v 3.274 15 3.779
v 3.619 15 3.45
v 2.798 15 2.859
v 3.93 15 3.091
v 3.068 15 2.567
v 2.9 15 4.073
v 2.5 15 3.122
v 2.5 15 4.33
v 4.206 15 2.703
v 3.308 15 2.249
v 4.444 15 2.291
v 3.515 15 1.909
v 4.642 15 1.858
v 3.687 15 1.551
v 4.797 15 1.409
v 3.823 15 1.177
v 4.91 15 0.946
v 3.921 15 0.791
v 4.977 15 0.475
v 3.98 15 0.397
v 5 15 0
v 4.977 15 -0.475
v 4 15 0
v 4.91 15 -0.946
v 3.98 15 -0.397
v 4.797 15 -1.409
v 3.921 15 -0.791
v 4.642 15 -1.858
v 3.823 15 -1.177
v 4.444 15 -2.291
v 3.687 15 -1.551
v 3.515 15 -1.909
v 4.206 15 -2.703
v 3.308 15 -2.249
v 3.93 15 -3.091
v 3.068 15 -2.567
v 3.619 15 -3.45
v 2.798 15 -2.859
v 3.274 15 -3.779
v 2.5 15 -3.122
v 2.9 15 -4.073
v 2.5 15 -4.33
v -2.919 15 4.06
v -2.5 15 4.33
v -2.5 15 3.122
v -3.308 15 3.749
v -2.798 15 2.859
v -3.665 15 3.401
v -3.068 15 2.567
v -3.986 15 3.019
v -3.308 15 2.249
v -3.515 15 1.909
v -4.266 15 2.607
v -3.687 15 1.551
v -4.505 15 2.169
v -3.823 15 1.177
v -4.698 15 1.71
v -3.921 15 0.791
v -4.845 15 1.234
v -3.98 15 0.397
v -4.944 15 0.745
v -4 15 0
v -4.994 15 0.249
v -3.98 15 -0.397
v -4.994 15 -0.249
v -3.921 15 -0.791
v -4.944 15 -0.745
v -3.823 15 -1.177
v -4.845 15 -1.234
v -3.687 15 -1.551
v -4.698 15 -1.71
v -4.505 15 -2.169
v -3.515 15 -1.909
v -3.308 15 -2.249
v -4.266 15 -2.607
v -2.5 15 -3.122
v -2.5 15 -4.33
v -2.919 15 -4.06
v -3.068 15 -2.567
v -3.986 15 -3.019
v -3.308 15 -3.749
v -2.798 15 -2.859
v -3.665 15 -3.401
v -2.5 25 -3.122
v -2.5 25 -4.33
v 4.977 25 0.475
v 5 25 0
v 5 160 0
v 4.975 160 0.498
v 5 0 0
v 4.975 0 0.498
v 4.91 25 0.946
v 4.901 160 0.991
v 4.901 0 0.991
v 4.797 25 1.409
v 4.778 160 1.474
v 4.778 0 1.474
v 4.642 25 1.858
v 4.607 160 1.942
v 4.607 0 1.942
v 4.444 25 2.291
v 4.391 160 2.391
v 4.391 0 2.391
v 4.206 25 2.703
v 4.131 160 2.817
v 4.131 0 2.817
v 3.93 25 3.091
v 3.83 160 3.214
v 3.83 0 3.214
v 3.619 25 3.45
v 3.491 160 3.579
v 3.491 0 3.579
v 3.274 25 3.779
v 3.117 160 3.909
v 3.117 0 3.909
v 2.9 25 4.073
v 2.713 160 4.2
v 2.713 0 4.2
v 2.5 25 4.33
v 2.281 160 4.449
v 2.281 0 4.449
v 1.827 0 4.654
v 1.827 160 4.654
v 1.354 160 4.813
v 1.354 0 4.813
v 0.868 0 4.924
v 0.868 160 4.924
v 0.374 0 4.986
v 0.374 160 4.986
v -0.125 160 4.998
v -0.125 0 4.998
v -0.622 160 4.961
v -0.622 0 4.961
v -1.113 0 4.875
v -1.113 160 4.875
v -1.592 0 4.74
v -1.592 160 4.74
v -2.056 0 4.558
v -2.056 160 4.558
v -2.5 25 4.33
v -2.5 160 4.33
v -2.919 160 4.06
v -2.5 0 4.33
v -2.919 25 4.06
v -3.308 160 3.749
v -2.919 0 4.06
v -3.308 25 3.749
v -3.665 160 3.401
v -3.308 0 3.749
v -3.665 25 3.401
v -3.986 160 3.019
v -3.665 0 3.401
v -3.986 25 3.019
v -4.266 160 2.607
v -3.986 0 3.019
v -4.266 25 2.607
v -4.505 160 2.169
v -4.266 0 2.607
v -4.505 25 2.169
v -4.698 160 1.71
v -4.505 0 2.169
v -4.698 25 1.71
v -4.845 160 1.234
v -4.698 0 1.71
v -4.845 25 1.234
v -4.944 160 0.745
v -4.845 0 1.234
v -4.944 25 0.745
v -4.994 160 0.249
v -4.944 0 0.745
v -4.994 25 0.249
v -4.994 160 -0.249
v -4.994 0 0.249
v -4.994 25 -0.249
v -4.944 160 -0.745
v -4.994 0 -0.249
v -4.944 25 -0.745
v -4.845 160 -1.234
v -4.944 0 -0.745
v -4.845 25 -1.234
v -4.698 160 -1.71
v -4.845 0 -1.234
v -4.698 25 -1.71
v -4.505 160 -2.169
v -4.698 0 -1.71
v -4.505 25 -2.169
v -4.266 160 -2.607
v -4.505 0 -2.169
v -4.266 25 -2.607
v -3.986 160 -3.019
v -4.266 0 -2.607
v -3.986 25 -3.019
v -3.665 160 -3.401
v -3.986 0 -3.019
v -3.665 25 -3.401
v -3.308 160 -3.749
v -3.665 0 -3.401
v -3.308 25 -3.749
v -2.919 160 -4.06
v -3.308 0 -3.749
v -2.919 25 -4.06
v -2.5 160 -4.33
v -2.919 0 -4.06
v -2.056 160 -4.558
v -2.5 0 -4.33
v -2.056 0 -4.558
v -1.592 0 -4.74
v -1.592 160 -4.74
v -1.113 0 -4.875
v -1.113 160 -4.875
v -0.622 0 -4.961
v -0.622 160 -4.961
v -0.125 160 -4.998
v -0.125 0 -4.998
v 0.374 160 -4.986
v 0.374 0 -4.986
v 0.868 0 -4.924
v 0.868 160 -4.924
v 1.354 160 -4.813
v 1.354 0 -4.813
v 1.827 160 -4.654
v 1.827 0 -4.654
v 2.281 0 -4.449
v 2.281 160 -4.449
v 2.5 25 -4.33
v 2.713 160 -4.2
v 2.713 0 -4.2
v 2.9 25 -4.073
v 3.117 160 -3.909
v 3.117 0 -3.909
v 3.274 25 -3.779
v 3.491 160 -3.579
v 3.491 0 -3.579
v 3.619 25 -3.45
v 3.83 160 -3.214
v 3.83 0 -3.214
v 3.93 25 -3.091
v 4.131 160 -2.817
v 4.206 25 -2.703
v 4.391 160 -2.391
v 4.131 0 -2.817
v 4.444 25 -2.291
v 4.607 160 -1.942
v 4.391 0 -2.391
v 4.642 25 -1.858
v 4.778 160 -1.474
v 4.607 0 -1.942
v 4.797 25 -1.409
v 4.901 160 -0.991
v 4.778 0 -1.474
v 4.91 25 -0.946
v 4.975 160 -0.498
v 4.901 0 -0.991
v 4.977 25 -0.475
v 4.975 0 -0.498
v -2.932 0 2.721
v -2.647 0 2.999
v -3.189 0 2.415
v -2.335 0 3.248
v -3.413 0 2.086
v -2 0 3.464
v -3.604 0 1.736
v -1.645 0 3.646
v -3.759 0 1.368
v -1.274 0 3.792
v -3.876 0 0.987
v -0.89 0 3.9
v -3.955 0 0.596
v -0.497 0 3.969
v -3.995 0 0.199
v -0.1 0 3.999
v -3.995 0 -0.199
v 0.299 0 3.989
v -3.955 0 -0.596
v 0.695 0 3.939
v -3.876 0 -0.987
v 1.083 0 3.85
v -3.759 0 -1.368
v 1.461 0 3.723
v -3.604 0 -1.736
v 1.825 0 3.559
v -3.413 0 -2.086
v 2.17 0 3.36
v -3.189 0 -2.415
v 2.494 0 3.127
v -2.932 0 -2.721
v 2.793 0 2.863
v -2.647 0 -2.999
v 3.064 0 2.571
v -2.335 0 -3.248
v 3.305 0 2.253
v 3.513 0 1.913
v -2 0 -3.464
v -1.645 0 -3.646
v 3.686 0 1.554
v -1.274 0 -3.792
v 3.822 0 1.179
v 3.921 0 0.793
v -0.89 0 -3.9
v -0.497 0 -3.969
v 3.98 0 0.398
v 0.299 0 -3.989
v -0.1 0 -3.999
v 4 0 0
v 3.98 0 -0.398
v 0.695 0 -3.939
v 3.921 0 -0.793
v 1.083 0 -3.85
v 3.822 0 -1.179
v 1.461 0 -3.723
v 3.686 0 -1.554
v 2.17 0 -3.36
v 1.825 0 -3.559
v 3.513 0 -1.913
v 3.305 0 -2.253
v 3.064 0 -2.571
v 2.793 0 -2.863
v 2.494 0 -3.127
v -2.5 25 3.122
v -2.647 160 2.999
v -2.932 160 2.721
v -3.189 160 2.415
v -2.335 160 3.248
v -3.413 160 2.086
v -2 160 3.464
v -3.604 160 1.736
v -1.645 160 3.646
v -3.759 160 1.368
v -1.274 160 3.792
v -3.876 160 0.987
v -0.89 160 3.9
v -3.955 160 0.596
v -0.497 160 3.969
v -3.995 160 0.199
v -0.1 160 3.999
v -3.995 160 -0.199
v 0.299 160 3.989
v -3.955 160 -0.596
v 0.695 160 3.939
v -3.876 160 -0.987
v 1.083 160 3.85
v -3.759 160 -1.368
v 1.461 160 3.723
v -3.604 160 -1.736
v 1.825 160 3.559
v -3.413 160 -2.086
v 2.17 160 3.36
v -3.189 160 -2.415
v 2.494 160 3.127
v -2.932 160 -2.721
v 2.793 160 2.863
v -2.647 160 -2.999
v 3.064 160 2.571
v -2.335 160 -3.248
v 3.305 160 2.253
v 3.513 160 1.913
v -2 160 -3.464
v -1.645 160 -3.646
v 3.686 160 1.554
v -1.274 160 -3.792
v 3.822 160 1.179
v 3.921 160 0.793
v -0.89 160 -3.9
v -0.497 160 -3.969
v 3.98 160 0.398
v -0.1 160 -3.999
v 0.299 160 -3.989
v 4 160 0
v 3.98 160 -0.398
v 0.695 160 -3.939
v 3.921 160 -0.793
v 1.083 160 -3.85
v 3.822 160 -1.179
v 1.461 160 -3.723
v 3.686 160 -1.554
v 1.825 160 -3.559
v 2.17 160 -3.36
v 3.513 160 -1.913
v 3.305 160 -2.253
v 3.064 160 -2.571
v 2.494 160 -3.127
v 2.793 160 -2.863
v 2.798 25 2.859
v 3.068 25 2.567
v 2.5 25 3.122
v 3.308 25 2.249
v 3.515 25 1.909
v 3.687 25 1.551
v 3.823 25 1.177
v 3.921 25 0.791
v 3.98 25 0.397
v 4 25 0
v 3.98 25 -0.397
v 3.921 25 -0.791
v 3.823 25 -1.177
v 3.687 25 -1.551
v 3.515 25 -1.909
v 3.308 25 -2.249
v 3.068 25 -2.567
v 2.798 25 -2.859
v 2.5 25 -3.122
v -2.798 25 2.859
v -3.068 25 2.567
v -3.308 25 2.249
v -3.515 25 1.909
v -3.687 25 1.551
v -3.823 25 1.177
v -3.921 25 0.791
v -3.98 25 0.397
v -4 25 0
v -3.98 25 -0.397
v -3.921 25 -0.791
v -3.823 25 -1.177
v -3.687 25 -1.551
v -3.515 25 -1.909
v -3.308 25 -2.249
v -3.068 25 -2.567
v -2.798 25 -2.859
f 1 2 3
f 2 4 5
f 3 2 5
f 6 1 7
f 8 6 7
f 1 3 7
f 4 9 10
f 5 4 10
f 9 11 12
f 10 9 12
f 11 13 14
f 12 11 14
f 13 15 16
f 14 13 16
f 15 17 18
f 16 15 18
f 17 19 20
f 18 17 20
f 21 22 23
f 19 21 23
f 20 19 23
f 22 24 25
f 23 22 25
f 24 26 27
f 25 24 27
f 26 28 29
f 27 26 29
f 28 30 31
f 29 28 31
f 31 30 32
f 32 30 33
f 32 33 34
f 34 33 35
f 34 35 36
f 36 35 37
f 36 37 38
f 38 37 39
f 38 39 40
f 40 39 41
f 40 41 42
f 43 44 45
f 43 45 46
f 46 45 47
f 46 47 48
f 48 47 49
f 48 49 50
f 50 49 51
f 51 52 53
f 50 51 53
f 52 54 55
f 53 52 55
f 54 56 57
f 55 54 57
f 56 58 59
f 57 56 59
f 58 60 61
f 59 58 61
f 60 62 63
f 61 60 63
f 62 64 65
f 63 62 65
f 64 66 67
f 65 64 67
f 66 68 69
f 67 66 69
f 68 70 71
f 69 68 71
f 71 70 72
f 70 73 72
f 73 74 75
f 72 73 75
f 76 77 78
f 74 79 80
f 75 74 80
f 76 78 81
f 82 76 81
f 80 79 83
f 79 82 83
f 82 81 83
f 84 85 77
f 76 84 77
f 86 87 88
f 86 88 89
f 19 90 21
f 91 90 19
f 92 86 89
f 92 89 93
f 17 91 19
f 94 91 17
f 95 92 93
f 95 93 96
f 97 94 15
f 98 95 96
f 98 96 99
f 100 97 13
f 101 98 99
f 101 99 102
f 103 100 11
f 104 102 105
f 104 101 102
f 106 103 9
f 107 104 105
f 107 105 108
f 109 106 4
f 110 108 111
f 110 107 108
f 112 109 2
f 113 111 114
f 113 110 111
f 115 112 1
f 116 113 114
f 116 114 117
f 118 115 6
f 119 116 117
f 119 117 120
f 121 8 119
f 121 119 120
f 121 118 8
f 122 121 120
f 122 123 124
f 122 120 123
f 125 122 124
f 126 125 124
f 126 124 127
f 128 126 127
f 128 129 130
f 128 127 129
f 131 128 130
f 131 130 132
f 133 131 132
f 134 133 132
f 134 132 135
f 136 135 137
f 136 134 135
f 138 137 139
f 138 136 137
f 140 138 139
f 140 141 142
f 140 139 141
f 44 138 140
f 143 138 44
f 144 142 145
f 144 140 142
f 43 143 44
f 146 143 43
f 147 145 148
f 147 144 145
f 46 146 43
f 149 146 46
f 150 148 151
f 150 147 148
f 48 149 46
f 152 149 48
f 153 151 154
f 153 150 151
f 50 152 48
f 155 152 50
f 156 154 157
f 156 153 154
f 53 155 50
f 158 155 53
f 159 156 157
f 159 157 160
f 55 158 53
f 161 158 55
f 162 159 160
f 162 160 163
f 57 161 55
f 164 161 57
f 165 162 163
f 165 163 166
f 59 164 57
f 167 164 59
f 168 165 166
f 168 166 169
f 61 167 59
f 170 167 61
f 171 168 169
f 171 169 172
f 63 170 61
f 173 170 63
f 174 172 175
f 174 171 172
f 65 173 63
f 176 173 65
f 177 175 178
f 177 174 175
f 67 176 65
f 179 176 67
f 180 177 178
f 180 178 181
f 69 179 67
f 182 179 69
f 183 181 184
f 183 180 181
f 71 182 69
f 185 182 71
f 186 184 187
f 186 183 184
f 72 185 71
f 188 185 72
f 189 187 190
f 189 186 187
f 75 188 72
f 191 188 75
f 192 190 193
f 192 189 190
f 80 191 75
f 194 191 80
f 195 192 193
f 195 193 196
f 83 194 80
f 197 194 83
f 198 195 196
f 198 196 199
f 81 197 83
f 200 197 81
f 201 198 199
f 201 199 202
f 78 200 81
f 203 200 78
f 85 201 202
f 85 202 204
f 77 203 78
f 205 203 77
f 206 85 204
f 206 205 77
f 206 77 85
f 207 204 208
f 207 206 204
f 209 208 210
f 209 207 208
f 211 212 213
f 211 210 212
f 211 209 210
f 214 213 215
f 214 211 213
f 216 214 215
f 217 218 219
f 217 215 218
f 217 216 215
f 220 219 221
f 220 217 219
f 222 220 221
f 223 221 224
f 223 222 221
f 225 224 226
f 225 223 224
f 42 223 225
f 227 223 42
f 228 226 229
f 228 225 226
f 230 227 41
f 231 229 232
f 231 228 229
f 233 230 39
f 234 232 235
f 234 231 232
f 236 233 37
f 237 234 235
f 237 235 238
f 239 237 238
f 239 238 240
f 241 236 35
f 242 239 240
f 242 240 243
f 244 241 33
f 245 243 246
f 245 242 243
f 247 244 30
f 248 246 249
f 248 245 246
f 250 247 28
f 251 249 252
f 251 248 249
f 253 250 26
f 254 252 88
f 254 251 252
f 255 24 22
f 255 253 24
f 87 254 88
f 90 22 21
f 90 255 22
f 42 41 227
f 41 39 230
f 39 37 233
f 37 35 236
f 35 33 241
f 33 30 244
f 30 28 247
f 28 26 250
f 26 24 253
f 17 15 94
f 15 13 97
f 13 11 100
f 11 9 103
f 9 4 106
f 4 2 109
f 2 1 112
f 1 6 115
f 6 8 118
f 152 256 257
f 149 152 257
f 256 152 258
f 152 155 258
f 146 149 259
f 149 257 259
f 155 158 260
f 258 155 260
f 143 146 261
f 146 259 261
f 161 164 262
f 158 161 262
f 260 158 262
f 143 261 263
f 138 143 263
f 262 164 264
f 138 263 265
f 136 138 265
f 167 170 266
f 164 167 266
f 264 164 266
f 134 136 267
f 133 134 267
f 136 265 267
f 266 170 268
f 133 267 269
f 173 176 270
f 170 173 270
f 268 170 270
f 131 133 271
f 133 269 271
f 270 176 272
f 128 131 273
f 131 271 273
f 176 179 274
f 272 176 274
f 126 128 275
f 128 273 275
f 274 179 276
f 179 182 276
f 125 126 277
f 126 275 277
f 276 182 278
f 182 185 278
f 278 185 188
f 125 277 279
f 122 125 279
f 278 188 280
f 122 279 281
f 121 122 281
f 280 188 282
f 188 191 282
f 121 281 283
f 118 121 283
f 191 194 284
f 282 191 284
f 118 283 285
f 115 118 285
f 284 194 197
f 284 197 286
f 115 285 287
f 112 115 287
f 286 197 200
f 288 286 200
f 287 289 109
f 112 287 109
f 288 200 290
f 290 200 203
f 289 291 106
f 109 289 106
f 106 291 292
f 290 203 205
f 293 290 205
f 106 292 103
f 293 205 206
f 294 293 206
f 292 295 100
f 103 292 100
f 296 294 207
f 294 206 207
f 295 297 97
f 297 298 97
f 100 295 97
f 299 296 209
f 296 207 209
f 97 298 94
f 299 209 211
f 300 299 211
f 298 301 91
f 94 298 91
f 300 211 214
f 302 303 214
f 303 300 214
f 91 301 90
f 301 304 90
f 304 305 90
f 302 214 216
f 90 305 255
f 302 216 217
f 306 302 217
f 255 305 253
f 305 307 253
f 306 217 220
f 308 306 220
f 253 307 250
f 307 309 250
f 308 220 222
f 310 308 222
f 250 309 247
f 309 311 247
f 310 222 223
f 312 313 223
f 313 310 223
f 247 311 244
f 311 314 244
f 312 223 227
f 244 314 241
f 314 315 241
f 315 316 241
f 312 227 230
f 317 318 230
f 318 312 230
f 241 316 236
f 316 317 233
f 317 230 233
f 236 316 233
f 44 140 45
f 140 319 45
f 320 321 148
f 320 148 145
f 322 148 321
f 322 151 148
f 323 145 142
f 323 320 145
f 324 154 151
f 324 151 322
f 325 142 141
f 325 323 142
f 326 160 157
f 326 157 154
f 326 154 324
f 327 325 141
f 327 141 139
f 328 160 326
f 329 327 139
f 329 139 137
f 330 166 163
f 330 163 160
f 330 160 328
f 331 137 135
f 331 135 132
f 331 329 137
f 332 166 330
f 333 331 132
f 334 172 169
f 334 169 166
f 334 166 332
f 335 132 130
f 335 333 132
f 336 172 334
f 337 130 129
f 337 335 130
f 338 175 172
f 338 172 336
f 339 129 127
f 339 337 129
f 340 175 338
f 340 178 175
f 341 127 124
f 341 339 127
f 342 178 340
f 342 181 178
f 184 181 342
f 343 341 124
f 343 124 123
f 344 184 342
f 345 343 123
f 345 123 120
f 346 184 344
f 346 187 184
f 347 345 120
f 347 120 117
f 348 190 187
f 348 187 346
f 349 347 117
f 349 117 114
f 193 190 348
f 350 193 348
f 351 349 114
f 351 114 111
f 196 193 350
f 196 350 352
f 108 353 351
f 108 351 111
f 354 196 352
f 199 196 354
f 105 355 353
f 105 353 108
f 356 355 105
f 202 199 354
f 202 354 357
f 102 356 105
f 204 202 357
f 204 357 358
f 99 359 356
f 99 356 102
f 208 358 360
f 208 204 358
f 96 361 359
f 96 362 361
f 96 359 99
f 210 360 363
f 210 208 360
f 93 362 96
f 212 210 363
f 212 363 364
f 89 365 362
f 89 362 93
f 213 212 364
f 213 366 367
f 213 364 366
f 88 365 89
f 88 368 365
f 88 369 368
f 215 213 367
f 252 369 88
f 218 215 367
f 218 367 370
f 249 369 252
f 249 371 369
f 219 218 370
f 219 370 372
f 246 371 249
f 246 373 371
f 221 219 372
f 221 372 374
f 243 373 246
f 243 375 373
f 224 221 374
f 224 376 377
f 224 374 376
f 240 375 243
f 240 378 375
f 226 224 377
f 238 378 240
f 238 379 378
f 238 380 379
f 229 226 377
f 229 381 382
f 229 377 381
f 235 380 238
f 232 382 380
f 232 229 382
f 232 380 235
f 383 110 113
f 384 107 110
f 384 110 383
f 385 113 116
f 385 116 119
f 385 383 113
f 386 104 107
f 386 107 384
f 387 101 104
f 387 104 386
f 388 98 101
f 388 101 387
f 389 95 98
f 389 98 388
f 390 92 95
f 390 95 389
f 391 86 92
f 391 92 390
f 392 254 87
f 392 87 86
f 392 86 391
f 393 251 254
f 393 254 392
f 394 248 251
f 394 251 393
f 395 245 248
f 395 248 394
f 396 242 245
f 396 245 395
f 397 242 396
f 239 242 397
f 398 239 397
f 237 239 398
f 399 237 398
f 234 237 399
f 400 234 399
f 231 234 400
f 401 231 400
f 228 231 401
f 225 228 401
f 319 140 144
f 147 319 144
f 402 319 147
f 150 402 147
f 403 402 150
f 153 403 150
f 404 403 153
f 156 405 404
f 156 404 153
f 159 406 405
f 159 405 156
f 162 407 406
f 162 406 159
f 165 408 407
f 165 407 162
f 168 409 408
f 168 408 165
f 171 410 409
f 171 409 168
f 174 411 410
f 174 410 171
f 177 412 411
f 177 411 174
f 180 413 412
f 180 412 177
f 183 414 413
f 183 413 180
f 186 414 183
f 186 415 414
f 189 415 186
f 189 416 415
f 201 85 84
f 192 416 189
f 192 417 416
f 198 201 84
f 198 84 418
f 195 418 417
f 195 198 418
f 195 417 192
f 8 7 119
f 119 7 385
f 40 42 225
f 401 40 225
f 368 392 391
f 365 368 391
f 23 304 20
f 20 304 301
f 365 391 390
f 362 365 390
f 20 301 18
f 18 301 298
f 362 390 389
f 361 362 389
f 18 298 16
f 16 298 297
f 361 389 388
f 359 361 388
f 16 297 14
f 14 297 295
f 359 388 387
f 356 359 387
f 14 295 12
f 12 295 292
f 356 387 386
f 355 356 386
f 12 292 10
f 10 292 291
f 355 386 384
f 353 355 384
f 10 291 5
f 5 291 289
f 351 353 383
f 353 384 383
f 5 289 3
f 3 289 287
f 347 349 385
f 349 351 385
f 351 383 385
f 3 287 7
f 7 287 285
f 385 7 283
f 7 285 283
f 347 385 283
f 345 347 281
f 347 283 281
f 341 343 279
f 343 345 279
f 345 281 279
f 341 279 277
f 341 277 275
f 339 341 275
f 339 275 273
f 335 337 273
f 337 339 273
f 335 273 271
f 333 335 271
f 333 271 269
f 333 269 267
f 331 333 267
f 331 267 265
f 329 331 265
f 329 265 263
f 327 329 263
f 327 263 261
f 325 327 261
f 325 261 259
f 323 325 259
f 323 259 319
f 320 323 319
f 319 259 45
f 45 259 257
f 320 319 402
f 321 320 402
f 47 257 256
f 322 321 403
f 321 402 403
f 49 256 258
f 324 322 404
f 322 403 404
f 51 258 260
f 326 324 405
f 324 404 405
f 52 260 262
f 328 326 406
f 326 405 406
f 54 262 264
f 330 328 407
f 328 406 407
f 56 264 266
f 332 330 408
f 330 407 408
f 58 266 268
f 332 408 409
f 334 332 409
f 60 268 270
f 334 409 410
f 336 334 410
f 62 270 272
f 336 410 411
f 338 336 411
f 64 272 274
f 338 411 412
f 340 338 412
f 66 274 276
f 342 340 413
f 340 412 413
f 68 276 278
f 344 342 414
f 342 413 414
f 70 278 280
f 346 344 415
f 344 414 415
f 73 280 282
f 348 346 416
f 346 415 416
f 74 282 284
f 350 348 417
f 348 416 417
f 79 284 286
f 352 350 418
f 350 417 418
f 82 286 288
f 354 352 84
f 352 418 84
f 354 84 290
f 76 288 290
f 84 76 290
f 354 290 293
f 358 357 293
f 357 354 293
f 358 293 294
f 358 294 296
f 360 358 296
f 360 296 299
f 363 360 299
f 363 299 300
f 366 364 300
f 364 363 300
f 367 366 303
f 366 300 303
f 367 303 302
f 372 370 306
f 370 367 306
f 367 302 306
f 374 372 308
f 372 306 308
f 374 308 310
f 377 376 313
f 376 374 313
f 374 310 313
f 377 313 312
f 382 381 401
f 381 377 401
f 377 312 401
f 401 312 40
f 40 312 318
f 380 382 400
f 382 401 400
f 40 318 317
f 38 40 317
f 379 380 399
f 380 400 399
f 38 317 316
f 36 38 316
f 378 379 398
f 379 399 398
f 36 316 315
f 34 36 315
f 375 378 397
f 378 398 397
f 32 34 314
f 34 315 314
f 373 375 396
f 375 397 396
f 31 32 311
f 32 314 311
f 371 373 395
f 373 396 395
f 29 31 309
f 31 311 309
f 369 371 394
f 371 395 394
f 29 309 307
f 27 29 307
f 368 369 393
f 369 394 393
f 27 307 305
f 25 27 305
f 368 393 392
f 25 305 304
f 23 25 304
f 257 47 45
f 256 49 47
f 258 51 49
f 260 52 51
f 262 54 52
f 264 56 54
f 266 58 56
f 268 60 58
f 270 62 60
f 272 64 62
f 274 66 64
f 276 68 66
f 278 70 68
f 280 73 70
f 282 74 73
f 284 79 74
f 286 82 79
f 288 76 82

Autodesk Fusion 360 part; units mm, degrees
sketch "Sketch1" plane through (0, 0, 0) normal (0, 1, 0) x (1, 0, 0)
  circle A0 centre (0, 0) radius 5
  circle A1 centre (0, 0) radius 4
  dimension "d1" = 10
  dimension "d2" = 8
extrude "Extrude1" add sketch "Sketch1" along normal blind 160
sketch "Sketch2" plane through (0, 0, 0) normal (0, 0, 1) x (1, 0, 0)
  line L0 (-5, 0) -> (5, 0)
  line L1 (5, 0) -> (5, 15)
  line L2 (5, 15) -> (-5, 15)
  line L3 (-5, 15) -> (-5, 0)
  line L4 (-5, 15) -> (5, 15)
  line L5 (5, 15) -> (5, 25)
  line L6 (5, 25) -> (-5, 25)
  line L7 (-5, 25) -> (-5, 15)
  line L8 (-5, 25) -> (-2.5, 25)
  line L9 (-2.5, 25) -> (-2.5, 15)
  line L10 (-2.5, 15) -> (-5, 15)
  line L11 (-5, 15) -> (-5, 25)
  line L12 (5, 15) -> (2.5, 15)
  line L13 (2.5, 15) -> (2.5, 25)
  line L14 (2.5, 25) -> (5, 25)
  line L15 (5, 25) -> (5, 15)
  dimension "d5" = 10
  dimension "d6" = 15
  dimension "d7" = 10
  dimension "d8" = 10
  dimension "d9" = 2.5
  dimension "d10" = 10
  dimension "d11" = 2.5
  dimension "d12" = 10
extrude "Extrude2" cut sketch "Sketch2" along normal mid plane 20 contours L2 L4 L6 L7 L8 L9 L10 L11 | L2 L4 L5 L6 L12 L13 L14 L15
equation "d2 = d1 - 2 mm"
equation "d5 = d1"
equation "d7 = d1"
equation "d9 = d1 / 4"
equation "d10 = d1"
equation "d11 = d1 / 4"
equation "d12 = d1"
equation "d13 = d1"
